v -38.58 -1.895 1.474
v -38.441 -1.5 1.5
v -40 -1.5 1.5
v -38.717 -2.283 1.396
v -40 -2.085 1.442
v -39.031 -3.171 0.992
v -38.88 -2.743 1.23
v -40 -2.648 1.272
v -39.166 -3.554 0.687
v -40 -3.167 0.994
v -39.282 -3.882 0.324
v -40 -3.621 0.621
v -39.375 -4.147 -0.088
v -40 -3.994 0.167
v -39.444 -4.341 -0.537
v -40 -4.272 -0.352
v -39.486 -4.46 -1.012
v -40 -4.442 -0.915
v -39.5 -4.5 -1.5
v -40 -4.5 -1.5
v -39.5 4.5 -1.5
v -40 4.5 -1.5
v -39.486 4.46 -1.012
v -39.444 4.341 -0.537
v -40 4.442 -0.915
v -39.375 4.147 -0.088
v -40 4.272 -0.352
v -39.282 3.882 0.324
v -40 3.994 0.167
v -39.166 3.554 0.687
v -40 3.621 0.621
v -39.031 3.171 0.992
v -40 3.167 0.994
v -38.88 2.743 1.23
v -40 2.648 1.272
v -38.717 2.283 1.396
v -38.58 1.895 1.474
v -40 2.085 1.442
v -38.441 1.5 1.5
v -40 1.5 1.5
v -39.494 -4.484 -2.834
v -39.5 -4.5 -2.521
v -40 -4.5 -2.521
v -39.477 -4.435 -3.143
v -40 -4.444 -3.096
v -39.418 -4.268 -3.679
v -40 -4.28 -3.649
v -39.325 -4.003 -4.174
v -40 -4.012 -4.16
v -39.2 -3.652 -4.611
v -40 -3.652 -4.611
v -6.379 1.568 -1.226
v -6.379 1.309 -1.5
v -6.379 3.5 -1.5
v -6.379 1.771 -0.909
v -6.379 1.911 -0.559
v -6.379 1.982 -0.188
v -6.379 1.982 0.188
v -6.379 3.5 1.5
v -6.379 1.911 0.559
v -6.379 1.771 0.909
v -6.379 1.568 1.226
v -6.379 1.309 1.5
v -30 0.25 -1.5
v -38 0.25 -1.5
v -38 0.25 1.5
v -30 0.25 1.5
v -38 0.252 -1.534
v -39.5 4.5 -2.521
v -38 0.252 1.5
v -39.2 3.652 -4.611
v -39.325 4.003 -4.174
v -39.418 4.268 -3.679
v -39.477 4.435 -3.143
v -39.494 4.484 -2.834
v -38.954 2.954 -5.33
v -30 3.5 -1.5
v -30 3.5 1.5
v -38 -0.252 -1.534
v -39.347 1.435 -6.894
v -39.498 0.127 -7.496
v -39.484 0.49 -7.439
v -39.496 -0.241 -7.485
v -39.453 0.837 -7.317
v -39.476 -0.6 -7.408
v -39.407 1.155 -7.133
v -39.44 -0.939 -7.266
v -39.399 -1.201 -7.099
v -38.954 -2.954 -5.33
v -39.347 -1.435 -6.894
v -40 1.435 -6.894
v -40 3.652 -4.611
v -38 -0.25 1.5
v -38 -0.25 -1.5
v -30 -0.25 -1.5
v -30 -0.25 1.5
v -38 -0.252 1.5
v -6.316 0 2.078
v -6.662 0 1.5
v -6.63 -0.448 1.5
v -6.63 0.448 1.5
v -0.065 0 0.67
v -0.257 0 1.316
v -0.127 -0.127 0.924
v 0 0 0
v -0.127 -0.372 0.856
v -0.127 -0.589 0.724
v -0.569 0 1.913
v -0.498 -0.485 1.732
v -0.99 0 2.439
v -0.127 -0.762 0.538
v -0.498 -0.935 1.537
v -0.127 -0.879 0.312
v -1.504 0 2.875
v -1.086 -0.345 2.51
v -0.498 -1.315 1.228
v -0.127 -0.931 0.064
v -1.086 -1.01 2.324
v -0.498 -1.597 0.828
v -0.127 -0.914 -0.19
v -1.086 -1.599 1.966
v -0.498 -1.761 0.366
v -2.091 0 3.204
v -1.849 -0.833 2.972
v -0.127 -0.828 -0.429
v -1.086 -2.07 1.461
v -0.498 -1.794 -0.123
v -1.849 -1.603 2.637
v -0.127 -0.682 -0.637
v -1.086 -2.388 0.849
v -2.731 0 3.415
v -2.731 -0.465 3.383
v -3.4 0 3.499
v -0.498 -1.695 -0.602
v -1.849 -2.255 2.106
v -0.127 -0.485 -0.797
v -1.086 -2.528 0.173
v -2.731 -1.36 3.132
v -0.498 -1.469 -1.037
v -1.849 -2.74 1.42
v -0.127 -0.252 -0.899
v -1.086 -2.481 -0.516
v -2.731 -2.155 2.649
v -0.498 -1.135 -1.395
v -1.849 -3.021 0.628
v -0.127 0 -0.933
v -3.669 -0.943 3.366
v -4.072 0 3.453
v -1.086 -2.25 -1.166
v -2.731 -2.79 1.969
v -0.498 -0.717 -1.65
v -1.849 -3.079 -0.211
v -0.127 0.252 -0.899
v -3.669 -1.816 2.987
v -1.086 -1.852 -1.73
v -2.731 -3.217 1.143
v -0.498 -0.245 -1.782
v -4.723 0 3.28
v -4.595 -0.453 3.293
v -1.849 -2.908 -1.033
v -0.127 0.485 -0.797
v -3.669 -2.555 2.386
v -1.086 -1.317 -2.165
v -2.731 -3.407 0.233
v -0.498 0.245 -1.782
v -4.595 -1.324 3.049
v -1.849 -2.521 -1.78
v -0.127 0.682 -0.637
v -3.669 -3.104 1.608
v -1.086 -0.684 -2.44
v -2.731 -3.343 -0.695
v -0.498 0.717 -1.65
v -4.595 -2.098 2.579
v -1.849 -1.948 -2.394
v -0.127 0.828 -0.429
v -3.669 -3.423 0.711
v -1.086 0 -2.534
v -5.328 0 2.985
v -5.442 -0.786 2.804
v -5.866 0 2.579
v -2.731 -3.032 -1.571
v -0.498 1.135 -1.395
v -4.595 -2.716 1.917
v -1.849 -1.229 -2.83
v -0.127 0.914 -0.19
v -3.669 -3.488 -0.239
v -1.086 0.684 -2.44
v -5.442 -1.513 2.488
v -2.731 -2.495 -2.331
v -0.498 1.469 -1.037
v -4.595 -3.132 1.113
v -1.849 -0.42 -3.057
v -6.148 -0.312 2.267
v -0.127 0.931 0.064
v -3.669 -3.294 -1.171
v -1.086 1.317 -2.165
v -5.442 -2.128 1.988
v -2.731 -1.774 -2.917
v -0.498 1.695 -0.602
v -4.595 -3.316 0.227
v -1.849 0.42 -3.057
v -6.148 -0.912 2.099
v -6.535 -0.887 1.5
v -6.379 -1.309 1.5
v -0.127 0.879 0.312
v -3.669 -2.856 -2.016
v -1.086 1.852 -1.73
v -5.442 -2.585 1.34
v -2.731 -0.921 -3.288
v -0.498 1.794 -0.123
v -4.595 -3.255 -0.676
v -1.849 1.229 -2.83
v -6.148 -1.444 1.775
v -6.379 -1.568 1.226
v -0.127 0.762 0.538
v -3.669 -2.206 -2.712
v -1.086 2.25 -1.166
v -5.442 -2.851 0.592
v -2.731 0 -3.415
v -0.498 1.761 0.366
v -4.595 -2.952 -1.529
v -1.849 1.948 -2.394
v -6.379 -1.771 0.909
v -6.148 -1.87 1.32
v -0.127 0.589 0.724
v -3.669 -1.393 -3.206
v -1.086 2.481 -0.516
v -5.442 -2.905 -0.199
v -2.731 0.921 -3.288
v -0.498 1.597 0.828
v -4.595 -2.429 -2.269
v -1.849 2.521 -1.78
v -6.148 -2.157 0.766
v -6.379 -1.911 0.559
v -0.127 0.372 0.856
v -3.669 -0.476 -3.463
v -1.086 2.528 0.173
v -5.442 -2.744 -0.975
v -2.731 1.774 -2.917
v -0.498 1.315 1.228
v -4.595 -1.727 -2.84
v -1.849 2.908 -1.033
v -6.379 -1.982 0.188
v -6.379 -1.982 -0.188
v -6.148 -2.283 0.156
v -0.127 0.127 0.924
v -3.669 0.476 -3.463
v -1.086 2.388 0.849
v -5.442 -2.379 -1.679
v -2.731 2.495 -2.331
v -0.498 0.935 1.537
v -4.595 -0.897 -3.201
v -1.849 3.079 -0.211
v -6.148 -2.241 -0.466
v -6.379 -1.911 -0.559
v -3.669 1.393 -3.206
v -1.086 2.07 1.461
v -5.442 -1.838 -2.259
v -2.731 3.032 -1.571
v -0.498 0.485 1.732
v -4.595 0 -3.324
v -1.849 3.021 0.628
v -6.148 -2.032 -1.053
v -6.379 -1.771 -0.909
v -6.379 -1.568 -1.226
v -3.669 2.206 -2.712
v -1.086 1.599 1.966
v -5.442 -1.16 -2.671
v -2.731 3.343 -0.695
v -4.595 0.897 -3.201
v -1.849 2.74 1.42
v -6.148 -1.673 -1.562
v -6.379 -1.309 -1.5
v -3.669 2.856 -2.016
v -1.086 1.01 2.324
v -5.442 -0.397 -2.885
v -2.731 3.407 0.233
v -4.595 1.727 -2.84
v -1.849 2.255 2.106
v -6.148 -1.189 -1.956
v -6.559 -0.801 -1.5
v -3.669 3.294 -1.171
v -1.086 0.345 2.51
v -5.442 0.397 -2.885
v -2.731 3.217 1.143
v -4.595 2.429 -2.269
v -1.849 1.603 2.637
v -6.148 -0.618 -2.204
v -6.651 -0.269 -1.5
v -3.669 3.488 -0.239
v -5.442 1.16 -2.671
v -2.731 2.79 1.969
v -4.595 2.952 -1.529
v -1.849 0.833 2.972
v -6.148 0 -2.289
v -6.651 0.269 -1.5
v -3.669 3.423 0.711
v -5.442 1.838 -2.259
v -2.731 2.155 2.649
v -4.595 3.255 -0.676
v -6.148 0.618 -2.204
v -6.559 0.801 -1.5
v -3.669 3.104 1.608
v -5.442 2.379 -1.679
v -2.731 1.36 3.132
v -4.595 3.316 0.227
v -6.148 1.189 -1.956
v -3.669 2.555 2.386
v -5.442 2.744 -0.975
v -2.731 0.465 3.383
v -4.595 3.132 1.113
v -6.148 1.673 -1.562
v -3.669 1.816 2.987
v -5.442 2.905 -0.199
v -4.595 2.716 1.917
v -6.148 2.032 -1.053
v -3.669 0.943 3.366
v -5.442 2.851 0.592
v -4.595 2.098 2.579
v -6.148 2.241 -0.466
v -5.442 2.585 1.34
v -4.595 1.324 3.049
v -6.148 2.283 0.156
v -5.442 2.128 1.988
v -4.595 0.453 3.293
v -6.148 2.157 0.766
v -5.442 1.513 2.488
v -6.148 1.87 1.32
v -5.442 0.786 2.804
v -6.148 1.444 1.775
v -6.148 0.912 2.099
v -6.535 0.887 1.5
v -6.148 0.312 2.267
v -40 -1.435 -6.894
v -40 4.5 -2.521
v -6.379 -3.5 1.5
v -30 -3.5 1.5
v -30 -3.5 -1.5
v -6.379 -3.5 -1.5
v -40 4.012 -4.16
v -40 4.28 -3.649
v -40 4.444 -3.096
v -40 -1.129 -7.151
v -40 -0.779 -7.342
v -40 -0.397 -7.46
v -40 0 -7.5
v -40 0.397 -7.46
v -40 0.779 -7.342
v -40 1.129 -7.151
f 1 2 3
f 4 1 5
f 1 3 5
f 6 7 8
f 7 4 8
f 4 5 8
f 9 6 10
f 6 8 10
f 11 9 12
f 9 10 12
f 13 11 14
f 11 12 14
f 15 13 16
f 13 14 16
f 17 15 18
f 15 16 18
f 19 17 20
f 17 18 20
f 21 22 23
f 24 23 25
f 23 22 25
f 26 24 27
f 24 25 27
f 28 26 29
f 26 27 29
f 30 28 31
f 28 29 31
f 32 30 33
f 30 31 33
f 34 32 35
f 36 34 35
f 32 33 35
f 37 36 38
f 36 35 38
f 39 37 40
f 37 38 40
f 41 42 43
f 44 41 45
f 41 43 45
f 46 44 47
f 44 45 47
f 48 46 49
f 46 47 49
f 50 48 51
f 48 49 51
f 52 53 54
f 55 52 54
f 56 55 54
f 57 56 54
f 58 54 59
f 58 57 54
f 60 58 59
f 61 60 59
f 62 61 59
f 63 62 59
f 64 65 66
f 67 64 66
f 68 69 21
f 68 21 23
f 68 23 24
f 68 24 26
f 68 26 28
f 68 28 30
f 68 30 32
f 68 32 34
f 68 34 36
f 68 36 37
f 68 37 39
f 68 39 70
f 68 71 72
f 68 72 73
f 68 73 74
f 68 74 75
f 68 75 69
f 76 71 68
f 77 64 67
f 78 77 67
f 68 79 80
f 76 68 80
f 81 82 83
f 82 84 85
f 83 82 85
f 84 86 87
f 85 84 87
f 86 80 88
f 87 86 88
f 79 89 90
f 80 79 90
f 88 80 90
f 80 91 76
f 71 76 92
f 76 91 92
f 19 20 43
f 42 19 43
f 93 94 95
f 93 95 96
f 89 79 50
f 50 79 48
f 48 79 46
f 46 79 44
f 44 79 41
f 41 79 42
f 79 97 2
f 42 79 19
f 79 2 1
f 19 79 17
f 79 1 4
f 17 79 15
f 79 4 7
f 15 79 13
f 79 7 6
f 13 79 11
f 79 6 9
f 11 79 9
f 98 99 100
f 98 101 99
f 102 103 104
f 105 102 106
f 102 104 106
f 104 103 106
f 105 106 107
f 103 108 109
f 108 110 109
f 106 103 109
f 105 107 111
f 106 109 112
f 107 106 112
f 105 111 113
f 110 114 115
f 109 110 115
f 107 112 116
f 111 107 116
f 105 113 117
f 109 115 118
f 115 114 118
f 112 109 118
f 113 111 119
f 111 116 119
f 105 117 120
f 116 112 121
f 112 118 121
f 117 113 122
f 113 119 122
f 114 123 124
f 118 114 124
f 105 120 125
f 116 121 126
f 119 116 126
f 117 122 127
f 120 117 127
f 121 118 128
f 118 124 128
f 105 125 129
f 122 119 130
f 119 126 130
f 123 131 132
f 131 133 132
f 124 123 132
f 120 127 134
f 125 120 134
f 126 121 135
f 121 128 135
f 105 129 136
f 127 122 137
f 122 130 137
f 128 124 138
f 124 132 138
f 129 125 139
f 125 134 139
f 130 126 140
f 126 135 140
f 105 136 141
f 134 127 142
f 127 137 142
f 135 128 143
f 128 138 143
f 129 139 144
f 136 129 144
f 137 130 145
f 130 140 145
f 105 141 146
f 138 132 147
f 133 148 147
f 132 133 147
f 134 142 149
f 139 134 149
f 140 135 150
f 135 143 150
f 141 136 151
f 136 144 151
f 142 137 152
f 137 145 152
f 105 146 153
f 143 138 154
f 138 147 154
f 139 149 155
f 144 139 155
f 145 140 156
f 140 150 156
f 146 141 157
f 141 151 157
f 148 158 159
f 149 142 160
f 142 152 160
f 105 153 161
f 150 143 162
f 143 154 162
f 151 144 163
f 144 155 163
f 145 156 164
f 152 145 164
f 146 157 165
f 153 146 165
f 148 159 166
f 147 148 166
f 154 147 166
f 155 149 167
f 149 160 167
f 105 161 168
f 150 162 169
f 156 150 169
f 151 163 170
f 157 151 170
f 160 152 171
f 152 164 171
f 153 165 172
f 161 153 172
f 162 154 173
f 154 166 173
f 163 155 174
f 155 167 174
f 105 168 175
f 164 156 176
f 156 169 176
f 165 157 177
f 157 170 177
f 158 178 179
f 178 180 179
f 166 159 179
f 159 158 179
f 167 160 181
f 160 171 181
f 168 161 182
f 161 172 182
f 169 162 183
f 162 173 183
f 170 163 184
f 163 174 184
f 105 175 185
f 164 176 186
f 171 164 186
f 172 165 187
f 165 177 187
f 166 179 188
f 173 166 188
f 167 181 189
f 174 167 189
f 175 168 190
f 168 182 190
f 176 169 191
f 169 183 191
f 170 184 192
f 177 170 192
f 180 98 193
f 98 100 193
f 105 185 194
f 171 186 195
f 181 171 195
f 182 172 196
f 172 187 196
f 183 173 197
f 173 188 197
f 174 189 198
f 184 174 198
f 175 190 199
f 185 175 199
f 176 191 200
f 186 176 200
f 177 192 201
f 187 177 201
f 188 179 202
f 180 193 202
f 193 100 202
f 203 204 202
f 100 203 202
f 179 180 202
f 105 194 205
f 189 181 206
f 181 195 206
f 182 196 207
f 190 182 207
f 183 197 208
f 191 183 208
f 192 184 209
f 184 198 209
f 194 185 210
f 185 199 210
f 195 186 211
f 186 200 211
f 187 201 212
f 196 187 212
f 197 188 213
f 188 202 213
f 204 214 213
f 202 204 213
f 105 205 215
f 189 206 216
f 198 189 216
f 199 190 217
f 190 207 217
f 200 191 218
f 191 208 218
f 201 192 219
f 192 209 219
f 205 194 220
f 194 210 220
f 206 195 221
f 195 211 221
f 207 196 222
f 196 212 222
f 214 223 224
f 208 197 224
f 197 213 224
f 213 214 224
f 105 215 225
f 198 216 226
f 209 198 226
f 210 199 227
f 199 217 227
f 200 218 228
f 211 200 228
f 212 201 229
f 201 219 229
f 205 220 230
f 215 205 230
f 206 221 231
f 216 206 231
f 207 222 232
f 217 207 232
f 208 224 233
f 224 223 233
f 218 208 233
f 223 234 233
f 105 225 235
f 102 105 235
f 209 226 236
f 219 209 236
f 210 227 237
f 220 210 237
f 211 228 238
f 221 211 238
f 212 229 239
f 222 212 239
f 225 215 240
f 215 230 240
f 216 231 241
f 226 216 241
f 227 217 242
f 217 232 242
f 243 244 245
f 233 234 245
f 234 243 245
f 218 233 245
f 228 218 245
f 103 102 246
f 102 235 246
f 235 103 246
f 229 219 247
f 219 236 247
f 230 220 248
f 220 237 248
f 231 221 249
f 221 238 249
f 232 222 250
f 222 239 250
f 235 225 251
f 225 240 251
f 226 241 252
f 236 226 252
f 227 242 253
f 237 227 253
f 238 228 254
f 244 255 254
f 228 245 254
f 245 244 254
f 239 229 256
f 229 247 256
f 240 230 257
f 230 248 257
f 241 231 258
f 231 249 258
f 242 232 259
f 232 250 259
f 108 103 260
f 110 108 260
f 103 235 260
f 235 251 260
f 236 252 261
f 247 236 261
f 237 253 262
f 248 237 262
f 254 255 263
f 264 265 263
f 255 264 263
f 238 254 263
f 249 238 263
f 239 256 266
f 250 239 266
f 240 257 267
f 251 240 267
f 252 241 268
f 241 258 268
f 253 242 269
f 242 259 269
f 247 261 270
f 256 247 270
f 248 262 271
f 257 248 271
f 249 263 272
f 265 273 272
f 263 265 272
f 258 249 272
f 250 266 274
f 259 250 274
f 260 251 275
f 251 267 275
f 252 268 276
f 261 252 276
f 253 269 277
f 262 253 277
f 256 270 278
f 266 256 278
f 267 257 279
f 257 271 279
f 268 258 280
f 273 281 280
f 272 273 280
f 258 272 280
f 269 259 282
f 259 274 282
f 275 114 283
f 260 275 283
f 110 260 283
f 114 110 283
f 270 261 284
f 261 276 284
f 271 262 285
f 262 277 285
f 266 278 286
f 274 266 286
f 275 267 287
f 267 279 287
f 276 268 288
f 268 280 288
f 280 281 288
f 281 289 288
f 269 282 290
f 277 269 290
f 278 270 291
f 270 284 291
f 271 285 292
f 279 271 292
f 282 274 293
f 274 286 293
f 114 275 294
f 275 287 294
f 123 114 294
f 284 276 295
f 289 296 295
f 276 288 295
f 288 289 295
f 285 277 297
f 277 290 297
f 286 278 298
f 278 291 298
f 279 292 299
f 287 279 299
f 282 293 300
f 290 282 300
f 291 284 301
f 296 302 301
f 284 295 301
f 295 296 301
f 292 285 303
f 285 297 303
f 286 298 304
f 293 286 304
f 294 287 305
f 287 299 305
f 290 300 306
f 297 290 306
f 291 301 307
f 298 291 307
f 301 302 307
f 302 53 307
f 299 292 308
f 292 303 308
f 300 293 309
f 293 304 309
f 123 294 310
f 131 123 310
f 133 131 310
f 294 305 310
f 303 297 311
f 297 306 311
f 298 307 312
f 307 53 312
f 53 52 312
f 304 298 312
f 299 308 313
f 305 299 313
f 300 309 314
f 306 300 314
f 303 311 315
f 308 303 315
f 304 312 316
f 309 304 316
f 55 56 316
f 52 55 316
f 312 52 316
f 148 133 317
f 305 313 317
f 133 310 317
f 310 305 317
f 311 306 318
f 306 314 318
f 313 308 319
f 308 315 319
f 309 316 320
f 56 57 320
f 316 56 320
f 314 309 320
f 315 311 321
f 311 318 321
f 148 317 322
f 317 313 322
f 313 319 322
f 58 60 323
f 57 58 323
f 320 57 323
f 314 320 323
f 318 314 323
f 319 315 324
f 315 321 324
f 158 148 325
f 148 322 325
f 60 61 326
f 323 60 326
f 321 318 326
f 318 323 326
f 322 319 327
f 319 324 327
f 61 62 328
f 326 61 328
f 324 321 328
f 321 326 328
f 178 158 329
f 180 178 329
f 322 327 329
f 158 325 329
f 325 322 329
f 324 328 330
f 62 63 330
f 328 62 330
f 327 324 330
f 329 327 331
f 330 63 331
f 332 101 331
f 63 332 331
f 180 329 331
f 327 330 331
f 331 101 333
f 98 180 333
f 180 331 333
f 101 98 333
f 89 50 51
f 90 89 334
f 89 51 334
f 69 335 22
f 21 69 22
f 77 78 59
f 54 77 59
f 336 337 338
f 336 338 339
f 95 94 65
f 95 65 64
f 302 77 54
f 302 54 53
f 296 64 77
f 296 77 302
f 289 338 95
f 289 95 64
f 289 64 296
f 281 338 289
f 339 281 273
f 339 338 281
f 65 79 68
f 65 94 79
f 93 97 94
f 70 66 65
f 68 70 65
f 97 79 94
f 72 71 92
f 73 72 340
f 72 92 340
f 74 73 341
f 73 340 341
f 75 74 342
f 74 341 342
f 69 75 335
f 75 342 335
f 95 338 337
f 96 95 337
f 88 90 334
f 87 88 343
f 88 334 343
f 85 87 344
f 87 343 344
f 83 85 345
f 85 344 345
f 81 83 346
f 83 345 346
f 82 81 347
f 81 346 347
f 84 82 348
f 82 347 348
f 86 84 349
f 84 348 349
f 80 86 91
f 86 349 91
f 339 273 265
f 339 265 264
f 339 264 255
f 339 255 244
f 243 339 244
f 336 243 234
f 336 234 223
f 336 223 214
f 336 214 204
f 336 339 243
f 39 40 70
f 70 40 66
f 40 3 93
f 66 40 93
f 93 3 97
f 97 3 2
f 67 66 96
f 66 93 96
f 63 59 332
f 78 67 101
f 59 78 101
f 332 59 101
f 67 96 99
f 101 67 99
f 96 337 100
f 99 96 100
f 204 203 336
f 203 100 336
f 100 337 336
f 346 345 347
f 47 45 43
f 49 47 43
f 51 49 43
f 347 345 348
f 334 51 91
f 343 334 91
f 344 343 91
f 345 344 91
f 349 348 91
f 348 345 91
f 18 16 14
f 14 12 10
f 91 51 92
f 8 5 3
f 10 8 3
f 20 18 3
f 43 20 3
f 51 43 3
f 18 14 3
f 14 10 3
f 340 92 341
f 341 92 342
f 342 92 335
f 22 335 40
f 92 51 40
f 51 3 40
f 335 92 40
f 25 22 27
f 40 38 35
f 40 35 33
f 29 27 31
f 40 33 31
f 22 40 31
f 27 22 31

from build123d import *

# Parameters (mm, degrees)
F2_W      = 23.6211707216
F2_H      = 3
F3_DEPTH  = 3.5
F6_DEPTH  = 2
F7_W      = 0.5
F7_H      = 3
F8_DEPTH  = 8
F12_DEPTH = 15
F14_DEPTH = 15


with BuildPart() as f1:
    # F0 (on Front) → F1 (revolve)
    with BuildSketch(Plane.XZ):
        with BuildLine():
            Line((-7, 0), (0, 0))
            ThreePointArc((0, 0), (-3.5, 3.5), (-7, 0))
        make_face()
    revolve(axis=Axis((-3.5, 0, 0), (1, 0, 0)))

    # F2 (on Front) → F3 (join, symmetric)
    with BuildSketch(Plane.XZ):
        with Locations((-18.1894146392, 0)):
            Rectangle(F2_W, F2_H)
    extrude(amount=F3_DEPTH, both=True)


with BuildPart() as f6:
    # F5 (on offset) → F6 (new body)
    with BuildSketch(Plane.YZ.offset(-40)):
        with BuildLine():
            ThreePointArc((4.5, -1.5), (3.6213203436, 0.6213203436), (1.5, 1.5))
            Line((1.5, 1.5), (-1.5, 1.5))
            ThreePointArc((-1.5, 1.5), (-3.6213203436, 0.6213203436), (-4.5, -1.5))
            Line((-4.5, -1.5), (-4.5, -2.5209097215))
            ThreePointArc((-4.5, -2.5209097215), (-4.2798610612, -3.6489046153), (-3.6517516798, -4.6113557764))
            Line((-3.6517516798, -4.6113557764), (-1.4345011199, -6.8936307033))
            ThreePointArc((-1.4345011199, -6.8936307033), (0, -7.5), (1.4345011199, -6.8936307033))
            Line((1.4345011199, -6.8936307033), (3.6517516798, -4.6113557764))
            ThreePointArc((3.6517516798, -4.6113557764), (4.2798610612, -3.6489046153), (4.5, -2.5209097215))
            Line((4.5, -2.5209097215), (4.5, -1.5))
        make_face()
    extrude(amount=F6_DEPTH)


with BuildPart() as f8:
    # F7 (on face) → F8 (new body, through all)
    with BuildSketch(Plane.YZ.offset(-38)):
        Rectangle(F7_W, F7_H)
    extrude(amount=F8_DEPTH)


with BuildPart() as f6_1:
    add(f6.part)

    # F9: union F8
    add(f8.part)


with BuildPart() as f1_1:
    add(f1.part)

    # F10: union F6
    add(f6_1.part)

    # F11 (on Top) → F12 (cut, symmetric)
    with BuildSketch(Plane.XY):
        Polygon((-39.5, 4.5), (-37.9991866648, 0.25), (-37.9909649491, 4.5), align=None)
        Polygon((-37.9909649491, -4.5), (-37.9991866648, -0.25), (-39.5, -4.5), align=None)
    extrude(amount=F12_DEPTH, both=True, mode=Mode.SUBTRACT)

    # F13 (on Front) → F14 (cut, symmetric)
    with BuildSketch(Plane.XZ):
        Polygon((-38, -7.5028174194), (-37.9915572703, -1.5), (-39.5, -7.5028174194), align=None)
    extrude(amount=F14_DEPTH, both=True, mode=Mode.SUBTRACT)


solid = f1_1.part
